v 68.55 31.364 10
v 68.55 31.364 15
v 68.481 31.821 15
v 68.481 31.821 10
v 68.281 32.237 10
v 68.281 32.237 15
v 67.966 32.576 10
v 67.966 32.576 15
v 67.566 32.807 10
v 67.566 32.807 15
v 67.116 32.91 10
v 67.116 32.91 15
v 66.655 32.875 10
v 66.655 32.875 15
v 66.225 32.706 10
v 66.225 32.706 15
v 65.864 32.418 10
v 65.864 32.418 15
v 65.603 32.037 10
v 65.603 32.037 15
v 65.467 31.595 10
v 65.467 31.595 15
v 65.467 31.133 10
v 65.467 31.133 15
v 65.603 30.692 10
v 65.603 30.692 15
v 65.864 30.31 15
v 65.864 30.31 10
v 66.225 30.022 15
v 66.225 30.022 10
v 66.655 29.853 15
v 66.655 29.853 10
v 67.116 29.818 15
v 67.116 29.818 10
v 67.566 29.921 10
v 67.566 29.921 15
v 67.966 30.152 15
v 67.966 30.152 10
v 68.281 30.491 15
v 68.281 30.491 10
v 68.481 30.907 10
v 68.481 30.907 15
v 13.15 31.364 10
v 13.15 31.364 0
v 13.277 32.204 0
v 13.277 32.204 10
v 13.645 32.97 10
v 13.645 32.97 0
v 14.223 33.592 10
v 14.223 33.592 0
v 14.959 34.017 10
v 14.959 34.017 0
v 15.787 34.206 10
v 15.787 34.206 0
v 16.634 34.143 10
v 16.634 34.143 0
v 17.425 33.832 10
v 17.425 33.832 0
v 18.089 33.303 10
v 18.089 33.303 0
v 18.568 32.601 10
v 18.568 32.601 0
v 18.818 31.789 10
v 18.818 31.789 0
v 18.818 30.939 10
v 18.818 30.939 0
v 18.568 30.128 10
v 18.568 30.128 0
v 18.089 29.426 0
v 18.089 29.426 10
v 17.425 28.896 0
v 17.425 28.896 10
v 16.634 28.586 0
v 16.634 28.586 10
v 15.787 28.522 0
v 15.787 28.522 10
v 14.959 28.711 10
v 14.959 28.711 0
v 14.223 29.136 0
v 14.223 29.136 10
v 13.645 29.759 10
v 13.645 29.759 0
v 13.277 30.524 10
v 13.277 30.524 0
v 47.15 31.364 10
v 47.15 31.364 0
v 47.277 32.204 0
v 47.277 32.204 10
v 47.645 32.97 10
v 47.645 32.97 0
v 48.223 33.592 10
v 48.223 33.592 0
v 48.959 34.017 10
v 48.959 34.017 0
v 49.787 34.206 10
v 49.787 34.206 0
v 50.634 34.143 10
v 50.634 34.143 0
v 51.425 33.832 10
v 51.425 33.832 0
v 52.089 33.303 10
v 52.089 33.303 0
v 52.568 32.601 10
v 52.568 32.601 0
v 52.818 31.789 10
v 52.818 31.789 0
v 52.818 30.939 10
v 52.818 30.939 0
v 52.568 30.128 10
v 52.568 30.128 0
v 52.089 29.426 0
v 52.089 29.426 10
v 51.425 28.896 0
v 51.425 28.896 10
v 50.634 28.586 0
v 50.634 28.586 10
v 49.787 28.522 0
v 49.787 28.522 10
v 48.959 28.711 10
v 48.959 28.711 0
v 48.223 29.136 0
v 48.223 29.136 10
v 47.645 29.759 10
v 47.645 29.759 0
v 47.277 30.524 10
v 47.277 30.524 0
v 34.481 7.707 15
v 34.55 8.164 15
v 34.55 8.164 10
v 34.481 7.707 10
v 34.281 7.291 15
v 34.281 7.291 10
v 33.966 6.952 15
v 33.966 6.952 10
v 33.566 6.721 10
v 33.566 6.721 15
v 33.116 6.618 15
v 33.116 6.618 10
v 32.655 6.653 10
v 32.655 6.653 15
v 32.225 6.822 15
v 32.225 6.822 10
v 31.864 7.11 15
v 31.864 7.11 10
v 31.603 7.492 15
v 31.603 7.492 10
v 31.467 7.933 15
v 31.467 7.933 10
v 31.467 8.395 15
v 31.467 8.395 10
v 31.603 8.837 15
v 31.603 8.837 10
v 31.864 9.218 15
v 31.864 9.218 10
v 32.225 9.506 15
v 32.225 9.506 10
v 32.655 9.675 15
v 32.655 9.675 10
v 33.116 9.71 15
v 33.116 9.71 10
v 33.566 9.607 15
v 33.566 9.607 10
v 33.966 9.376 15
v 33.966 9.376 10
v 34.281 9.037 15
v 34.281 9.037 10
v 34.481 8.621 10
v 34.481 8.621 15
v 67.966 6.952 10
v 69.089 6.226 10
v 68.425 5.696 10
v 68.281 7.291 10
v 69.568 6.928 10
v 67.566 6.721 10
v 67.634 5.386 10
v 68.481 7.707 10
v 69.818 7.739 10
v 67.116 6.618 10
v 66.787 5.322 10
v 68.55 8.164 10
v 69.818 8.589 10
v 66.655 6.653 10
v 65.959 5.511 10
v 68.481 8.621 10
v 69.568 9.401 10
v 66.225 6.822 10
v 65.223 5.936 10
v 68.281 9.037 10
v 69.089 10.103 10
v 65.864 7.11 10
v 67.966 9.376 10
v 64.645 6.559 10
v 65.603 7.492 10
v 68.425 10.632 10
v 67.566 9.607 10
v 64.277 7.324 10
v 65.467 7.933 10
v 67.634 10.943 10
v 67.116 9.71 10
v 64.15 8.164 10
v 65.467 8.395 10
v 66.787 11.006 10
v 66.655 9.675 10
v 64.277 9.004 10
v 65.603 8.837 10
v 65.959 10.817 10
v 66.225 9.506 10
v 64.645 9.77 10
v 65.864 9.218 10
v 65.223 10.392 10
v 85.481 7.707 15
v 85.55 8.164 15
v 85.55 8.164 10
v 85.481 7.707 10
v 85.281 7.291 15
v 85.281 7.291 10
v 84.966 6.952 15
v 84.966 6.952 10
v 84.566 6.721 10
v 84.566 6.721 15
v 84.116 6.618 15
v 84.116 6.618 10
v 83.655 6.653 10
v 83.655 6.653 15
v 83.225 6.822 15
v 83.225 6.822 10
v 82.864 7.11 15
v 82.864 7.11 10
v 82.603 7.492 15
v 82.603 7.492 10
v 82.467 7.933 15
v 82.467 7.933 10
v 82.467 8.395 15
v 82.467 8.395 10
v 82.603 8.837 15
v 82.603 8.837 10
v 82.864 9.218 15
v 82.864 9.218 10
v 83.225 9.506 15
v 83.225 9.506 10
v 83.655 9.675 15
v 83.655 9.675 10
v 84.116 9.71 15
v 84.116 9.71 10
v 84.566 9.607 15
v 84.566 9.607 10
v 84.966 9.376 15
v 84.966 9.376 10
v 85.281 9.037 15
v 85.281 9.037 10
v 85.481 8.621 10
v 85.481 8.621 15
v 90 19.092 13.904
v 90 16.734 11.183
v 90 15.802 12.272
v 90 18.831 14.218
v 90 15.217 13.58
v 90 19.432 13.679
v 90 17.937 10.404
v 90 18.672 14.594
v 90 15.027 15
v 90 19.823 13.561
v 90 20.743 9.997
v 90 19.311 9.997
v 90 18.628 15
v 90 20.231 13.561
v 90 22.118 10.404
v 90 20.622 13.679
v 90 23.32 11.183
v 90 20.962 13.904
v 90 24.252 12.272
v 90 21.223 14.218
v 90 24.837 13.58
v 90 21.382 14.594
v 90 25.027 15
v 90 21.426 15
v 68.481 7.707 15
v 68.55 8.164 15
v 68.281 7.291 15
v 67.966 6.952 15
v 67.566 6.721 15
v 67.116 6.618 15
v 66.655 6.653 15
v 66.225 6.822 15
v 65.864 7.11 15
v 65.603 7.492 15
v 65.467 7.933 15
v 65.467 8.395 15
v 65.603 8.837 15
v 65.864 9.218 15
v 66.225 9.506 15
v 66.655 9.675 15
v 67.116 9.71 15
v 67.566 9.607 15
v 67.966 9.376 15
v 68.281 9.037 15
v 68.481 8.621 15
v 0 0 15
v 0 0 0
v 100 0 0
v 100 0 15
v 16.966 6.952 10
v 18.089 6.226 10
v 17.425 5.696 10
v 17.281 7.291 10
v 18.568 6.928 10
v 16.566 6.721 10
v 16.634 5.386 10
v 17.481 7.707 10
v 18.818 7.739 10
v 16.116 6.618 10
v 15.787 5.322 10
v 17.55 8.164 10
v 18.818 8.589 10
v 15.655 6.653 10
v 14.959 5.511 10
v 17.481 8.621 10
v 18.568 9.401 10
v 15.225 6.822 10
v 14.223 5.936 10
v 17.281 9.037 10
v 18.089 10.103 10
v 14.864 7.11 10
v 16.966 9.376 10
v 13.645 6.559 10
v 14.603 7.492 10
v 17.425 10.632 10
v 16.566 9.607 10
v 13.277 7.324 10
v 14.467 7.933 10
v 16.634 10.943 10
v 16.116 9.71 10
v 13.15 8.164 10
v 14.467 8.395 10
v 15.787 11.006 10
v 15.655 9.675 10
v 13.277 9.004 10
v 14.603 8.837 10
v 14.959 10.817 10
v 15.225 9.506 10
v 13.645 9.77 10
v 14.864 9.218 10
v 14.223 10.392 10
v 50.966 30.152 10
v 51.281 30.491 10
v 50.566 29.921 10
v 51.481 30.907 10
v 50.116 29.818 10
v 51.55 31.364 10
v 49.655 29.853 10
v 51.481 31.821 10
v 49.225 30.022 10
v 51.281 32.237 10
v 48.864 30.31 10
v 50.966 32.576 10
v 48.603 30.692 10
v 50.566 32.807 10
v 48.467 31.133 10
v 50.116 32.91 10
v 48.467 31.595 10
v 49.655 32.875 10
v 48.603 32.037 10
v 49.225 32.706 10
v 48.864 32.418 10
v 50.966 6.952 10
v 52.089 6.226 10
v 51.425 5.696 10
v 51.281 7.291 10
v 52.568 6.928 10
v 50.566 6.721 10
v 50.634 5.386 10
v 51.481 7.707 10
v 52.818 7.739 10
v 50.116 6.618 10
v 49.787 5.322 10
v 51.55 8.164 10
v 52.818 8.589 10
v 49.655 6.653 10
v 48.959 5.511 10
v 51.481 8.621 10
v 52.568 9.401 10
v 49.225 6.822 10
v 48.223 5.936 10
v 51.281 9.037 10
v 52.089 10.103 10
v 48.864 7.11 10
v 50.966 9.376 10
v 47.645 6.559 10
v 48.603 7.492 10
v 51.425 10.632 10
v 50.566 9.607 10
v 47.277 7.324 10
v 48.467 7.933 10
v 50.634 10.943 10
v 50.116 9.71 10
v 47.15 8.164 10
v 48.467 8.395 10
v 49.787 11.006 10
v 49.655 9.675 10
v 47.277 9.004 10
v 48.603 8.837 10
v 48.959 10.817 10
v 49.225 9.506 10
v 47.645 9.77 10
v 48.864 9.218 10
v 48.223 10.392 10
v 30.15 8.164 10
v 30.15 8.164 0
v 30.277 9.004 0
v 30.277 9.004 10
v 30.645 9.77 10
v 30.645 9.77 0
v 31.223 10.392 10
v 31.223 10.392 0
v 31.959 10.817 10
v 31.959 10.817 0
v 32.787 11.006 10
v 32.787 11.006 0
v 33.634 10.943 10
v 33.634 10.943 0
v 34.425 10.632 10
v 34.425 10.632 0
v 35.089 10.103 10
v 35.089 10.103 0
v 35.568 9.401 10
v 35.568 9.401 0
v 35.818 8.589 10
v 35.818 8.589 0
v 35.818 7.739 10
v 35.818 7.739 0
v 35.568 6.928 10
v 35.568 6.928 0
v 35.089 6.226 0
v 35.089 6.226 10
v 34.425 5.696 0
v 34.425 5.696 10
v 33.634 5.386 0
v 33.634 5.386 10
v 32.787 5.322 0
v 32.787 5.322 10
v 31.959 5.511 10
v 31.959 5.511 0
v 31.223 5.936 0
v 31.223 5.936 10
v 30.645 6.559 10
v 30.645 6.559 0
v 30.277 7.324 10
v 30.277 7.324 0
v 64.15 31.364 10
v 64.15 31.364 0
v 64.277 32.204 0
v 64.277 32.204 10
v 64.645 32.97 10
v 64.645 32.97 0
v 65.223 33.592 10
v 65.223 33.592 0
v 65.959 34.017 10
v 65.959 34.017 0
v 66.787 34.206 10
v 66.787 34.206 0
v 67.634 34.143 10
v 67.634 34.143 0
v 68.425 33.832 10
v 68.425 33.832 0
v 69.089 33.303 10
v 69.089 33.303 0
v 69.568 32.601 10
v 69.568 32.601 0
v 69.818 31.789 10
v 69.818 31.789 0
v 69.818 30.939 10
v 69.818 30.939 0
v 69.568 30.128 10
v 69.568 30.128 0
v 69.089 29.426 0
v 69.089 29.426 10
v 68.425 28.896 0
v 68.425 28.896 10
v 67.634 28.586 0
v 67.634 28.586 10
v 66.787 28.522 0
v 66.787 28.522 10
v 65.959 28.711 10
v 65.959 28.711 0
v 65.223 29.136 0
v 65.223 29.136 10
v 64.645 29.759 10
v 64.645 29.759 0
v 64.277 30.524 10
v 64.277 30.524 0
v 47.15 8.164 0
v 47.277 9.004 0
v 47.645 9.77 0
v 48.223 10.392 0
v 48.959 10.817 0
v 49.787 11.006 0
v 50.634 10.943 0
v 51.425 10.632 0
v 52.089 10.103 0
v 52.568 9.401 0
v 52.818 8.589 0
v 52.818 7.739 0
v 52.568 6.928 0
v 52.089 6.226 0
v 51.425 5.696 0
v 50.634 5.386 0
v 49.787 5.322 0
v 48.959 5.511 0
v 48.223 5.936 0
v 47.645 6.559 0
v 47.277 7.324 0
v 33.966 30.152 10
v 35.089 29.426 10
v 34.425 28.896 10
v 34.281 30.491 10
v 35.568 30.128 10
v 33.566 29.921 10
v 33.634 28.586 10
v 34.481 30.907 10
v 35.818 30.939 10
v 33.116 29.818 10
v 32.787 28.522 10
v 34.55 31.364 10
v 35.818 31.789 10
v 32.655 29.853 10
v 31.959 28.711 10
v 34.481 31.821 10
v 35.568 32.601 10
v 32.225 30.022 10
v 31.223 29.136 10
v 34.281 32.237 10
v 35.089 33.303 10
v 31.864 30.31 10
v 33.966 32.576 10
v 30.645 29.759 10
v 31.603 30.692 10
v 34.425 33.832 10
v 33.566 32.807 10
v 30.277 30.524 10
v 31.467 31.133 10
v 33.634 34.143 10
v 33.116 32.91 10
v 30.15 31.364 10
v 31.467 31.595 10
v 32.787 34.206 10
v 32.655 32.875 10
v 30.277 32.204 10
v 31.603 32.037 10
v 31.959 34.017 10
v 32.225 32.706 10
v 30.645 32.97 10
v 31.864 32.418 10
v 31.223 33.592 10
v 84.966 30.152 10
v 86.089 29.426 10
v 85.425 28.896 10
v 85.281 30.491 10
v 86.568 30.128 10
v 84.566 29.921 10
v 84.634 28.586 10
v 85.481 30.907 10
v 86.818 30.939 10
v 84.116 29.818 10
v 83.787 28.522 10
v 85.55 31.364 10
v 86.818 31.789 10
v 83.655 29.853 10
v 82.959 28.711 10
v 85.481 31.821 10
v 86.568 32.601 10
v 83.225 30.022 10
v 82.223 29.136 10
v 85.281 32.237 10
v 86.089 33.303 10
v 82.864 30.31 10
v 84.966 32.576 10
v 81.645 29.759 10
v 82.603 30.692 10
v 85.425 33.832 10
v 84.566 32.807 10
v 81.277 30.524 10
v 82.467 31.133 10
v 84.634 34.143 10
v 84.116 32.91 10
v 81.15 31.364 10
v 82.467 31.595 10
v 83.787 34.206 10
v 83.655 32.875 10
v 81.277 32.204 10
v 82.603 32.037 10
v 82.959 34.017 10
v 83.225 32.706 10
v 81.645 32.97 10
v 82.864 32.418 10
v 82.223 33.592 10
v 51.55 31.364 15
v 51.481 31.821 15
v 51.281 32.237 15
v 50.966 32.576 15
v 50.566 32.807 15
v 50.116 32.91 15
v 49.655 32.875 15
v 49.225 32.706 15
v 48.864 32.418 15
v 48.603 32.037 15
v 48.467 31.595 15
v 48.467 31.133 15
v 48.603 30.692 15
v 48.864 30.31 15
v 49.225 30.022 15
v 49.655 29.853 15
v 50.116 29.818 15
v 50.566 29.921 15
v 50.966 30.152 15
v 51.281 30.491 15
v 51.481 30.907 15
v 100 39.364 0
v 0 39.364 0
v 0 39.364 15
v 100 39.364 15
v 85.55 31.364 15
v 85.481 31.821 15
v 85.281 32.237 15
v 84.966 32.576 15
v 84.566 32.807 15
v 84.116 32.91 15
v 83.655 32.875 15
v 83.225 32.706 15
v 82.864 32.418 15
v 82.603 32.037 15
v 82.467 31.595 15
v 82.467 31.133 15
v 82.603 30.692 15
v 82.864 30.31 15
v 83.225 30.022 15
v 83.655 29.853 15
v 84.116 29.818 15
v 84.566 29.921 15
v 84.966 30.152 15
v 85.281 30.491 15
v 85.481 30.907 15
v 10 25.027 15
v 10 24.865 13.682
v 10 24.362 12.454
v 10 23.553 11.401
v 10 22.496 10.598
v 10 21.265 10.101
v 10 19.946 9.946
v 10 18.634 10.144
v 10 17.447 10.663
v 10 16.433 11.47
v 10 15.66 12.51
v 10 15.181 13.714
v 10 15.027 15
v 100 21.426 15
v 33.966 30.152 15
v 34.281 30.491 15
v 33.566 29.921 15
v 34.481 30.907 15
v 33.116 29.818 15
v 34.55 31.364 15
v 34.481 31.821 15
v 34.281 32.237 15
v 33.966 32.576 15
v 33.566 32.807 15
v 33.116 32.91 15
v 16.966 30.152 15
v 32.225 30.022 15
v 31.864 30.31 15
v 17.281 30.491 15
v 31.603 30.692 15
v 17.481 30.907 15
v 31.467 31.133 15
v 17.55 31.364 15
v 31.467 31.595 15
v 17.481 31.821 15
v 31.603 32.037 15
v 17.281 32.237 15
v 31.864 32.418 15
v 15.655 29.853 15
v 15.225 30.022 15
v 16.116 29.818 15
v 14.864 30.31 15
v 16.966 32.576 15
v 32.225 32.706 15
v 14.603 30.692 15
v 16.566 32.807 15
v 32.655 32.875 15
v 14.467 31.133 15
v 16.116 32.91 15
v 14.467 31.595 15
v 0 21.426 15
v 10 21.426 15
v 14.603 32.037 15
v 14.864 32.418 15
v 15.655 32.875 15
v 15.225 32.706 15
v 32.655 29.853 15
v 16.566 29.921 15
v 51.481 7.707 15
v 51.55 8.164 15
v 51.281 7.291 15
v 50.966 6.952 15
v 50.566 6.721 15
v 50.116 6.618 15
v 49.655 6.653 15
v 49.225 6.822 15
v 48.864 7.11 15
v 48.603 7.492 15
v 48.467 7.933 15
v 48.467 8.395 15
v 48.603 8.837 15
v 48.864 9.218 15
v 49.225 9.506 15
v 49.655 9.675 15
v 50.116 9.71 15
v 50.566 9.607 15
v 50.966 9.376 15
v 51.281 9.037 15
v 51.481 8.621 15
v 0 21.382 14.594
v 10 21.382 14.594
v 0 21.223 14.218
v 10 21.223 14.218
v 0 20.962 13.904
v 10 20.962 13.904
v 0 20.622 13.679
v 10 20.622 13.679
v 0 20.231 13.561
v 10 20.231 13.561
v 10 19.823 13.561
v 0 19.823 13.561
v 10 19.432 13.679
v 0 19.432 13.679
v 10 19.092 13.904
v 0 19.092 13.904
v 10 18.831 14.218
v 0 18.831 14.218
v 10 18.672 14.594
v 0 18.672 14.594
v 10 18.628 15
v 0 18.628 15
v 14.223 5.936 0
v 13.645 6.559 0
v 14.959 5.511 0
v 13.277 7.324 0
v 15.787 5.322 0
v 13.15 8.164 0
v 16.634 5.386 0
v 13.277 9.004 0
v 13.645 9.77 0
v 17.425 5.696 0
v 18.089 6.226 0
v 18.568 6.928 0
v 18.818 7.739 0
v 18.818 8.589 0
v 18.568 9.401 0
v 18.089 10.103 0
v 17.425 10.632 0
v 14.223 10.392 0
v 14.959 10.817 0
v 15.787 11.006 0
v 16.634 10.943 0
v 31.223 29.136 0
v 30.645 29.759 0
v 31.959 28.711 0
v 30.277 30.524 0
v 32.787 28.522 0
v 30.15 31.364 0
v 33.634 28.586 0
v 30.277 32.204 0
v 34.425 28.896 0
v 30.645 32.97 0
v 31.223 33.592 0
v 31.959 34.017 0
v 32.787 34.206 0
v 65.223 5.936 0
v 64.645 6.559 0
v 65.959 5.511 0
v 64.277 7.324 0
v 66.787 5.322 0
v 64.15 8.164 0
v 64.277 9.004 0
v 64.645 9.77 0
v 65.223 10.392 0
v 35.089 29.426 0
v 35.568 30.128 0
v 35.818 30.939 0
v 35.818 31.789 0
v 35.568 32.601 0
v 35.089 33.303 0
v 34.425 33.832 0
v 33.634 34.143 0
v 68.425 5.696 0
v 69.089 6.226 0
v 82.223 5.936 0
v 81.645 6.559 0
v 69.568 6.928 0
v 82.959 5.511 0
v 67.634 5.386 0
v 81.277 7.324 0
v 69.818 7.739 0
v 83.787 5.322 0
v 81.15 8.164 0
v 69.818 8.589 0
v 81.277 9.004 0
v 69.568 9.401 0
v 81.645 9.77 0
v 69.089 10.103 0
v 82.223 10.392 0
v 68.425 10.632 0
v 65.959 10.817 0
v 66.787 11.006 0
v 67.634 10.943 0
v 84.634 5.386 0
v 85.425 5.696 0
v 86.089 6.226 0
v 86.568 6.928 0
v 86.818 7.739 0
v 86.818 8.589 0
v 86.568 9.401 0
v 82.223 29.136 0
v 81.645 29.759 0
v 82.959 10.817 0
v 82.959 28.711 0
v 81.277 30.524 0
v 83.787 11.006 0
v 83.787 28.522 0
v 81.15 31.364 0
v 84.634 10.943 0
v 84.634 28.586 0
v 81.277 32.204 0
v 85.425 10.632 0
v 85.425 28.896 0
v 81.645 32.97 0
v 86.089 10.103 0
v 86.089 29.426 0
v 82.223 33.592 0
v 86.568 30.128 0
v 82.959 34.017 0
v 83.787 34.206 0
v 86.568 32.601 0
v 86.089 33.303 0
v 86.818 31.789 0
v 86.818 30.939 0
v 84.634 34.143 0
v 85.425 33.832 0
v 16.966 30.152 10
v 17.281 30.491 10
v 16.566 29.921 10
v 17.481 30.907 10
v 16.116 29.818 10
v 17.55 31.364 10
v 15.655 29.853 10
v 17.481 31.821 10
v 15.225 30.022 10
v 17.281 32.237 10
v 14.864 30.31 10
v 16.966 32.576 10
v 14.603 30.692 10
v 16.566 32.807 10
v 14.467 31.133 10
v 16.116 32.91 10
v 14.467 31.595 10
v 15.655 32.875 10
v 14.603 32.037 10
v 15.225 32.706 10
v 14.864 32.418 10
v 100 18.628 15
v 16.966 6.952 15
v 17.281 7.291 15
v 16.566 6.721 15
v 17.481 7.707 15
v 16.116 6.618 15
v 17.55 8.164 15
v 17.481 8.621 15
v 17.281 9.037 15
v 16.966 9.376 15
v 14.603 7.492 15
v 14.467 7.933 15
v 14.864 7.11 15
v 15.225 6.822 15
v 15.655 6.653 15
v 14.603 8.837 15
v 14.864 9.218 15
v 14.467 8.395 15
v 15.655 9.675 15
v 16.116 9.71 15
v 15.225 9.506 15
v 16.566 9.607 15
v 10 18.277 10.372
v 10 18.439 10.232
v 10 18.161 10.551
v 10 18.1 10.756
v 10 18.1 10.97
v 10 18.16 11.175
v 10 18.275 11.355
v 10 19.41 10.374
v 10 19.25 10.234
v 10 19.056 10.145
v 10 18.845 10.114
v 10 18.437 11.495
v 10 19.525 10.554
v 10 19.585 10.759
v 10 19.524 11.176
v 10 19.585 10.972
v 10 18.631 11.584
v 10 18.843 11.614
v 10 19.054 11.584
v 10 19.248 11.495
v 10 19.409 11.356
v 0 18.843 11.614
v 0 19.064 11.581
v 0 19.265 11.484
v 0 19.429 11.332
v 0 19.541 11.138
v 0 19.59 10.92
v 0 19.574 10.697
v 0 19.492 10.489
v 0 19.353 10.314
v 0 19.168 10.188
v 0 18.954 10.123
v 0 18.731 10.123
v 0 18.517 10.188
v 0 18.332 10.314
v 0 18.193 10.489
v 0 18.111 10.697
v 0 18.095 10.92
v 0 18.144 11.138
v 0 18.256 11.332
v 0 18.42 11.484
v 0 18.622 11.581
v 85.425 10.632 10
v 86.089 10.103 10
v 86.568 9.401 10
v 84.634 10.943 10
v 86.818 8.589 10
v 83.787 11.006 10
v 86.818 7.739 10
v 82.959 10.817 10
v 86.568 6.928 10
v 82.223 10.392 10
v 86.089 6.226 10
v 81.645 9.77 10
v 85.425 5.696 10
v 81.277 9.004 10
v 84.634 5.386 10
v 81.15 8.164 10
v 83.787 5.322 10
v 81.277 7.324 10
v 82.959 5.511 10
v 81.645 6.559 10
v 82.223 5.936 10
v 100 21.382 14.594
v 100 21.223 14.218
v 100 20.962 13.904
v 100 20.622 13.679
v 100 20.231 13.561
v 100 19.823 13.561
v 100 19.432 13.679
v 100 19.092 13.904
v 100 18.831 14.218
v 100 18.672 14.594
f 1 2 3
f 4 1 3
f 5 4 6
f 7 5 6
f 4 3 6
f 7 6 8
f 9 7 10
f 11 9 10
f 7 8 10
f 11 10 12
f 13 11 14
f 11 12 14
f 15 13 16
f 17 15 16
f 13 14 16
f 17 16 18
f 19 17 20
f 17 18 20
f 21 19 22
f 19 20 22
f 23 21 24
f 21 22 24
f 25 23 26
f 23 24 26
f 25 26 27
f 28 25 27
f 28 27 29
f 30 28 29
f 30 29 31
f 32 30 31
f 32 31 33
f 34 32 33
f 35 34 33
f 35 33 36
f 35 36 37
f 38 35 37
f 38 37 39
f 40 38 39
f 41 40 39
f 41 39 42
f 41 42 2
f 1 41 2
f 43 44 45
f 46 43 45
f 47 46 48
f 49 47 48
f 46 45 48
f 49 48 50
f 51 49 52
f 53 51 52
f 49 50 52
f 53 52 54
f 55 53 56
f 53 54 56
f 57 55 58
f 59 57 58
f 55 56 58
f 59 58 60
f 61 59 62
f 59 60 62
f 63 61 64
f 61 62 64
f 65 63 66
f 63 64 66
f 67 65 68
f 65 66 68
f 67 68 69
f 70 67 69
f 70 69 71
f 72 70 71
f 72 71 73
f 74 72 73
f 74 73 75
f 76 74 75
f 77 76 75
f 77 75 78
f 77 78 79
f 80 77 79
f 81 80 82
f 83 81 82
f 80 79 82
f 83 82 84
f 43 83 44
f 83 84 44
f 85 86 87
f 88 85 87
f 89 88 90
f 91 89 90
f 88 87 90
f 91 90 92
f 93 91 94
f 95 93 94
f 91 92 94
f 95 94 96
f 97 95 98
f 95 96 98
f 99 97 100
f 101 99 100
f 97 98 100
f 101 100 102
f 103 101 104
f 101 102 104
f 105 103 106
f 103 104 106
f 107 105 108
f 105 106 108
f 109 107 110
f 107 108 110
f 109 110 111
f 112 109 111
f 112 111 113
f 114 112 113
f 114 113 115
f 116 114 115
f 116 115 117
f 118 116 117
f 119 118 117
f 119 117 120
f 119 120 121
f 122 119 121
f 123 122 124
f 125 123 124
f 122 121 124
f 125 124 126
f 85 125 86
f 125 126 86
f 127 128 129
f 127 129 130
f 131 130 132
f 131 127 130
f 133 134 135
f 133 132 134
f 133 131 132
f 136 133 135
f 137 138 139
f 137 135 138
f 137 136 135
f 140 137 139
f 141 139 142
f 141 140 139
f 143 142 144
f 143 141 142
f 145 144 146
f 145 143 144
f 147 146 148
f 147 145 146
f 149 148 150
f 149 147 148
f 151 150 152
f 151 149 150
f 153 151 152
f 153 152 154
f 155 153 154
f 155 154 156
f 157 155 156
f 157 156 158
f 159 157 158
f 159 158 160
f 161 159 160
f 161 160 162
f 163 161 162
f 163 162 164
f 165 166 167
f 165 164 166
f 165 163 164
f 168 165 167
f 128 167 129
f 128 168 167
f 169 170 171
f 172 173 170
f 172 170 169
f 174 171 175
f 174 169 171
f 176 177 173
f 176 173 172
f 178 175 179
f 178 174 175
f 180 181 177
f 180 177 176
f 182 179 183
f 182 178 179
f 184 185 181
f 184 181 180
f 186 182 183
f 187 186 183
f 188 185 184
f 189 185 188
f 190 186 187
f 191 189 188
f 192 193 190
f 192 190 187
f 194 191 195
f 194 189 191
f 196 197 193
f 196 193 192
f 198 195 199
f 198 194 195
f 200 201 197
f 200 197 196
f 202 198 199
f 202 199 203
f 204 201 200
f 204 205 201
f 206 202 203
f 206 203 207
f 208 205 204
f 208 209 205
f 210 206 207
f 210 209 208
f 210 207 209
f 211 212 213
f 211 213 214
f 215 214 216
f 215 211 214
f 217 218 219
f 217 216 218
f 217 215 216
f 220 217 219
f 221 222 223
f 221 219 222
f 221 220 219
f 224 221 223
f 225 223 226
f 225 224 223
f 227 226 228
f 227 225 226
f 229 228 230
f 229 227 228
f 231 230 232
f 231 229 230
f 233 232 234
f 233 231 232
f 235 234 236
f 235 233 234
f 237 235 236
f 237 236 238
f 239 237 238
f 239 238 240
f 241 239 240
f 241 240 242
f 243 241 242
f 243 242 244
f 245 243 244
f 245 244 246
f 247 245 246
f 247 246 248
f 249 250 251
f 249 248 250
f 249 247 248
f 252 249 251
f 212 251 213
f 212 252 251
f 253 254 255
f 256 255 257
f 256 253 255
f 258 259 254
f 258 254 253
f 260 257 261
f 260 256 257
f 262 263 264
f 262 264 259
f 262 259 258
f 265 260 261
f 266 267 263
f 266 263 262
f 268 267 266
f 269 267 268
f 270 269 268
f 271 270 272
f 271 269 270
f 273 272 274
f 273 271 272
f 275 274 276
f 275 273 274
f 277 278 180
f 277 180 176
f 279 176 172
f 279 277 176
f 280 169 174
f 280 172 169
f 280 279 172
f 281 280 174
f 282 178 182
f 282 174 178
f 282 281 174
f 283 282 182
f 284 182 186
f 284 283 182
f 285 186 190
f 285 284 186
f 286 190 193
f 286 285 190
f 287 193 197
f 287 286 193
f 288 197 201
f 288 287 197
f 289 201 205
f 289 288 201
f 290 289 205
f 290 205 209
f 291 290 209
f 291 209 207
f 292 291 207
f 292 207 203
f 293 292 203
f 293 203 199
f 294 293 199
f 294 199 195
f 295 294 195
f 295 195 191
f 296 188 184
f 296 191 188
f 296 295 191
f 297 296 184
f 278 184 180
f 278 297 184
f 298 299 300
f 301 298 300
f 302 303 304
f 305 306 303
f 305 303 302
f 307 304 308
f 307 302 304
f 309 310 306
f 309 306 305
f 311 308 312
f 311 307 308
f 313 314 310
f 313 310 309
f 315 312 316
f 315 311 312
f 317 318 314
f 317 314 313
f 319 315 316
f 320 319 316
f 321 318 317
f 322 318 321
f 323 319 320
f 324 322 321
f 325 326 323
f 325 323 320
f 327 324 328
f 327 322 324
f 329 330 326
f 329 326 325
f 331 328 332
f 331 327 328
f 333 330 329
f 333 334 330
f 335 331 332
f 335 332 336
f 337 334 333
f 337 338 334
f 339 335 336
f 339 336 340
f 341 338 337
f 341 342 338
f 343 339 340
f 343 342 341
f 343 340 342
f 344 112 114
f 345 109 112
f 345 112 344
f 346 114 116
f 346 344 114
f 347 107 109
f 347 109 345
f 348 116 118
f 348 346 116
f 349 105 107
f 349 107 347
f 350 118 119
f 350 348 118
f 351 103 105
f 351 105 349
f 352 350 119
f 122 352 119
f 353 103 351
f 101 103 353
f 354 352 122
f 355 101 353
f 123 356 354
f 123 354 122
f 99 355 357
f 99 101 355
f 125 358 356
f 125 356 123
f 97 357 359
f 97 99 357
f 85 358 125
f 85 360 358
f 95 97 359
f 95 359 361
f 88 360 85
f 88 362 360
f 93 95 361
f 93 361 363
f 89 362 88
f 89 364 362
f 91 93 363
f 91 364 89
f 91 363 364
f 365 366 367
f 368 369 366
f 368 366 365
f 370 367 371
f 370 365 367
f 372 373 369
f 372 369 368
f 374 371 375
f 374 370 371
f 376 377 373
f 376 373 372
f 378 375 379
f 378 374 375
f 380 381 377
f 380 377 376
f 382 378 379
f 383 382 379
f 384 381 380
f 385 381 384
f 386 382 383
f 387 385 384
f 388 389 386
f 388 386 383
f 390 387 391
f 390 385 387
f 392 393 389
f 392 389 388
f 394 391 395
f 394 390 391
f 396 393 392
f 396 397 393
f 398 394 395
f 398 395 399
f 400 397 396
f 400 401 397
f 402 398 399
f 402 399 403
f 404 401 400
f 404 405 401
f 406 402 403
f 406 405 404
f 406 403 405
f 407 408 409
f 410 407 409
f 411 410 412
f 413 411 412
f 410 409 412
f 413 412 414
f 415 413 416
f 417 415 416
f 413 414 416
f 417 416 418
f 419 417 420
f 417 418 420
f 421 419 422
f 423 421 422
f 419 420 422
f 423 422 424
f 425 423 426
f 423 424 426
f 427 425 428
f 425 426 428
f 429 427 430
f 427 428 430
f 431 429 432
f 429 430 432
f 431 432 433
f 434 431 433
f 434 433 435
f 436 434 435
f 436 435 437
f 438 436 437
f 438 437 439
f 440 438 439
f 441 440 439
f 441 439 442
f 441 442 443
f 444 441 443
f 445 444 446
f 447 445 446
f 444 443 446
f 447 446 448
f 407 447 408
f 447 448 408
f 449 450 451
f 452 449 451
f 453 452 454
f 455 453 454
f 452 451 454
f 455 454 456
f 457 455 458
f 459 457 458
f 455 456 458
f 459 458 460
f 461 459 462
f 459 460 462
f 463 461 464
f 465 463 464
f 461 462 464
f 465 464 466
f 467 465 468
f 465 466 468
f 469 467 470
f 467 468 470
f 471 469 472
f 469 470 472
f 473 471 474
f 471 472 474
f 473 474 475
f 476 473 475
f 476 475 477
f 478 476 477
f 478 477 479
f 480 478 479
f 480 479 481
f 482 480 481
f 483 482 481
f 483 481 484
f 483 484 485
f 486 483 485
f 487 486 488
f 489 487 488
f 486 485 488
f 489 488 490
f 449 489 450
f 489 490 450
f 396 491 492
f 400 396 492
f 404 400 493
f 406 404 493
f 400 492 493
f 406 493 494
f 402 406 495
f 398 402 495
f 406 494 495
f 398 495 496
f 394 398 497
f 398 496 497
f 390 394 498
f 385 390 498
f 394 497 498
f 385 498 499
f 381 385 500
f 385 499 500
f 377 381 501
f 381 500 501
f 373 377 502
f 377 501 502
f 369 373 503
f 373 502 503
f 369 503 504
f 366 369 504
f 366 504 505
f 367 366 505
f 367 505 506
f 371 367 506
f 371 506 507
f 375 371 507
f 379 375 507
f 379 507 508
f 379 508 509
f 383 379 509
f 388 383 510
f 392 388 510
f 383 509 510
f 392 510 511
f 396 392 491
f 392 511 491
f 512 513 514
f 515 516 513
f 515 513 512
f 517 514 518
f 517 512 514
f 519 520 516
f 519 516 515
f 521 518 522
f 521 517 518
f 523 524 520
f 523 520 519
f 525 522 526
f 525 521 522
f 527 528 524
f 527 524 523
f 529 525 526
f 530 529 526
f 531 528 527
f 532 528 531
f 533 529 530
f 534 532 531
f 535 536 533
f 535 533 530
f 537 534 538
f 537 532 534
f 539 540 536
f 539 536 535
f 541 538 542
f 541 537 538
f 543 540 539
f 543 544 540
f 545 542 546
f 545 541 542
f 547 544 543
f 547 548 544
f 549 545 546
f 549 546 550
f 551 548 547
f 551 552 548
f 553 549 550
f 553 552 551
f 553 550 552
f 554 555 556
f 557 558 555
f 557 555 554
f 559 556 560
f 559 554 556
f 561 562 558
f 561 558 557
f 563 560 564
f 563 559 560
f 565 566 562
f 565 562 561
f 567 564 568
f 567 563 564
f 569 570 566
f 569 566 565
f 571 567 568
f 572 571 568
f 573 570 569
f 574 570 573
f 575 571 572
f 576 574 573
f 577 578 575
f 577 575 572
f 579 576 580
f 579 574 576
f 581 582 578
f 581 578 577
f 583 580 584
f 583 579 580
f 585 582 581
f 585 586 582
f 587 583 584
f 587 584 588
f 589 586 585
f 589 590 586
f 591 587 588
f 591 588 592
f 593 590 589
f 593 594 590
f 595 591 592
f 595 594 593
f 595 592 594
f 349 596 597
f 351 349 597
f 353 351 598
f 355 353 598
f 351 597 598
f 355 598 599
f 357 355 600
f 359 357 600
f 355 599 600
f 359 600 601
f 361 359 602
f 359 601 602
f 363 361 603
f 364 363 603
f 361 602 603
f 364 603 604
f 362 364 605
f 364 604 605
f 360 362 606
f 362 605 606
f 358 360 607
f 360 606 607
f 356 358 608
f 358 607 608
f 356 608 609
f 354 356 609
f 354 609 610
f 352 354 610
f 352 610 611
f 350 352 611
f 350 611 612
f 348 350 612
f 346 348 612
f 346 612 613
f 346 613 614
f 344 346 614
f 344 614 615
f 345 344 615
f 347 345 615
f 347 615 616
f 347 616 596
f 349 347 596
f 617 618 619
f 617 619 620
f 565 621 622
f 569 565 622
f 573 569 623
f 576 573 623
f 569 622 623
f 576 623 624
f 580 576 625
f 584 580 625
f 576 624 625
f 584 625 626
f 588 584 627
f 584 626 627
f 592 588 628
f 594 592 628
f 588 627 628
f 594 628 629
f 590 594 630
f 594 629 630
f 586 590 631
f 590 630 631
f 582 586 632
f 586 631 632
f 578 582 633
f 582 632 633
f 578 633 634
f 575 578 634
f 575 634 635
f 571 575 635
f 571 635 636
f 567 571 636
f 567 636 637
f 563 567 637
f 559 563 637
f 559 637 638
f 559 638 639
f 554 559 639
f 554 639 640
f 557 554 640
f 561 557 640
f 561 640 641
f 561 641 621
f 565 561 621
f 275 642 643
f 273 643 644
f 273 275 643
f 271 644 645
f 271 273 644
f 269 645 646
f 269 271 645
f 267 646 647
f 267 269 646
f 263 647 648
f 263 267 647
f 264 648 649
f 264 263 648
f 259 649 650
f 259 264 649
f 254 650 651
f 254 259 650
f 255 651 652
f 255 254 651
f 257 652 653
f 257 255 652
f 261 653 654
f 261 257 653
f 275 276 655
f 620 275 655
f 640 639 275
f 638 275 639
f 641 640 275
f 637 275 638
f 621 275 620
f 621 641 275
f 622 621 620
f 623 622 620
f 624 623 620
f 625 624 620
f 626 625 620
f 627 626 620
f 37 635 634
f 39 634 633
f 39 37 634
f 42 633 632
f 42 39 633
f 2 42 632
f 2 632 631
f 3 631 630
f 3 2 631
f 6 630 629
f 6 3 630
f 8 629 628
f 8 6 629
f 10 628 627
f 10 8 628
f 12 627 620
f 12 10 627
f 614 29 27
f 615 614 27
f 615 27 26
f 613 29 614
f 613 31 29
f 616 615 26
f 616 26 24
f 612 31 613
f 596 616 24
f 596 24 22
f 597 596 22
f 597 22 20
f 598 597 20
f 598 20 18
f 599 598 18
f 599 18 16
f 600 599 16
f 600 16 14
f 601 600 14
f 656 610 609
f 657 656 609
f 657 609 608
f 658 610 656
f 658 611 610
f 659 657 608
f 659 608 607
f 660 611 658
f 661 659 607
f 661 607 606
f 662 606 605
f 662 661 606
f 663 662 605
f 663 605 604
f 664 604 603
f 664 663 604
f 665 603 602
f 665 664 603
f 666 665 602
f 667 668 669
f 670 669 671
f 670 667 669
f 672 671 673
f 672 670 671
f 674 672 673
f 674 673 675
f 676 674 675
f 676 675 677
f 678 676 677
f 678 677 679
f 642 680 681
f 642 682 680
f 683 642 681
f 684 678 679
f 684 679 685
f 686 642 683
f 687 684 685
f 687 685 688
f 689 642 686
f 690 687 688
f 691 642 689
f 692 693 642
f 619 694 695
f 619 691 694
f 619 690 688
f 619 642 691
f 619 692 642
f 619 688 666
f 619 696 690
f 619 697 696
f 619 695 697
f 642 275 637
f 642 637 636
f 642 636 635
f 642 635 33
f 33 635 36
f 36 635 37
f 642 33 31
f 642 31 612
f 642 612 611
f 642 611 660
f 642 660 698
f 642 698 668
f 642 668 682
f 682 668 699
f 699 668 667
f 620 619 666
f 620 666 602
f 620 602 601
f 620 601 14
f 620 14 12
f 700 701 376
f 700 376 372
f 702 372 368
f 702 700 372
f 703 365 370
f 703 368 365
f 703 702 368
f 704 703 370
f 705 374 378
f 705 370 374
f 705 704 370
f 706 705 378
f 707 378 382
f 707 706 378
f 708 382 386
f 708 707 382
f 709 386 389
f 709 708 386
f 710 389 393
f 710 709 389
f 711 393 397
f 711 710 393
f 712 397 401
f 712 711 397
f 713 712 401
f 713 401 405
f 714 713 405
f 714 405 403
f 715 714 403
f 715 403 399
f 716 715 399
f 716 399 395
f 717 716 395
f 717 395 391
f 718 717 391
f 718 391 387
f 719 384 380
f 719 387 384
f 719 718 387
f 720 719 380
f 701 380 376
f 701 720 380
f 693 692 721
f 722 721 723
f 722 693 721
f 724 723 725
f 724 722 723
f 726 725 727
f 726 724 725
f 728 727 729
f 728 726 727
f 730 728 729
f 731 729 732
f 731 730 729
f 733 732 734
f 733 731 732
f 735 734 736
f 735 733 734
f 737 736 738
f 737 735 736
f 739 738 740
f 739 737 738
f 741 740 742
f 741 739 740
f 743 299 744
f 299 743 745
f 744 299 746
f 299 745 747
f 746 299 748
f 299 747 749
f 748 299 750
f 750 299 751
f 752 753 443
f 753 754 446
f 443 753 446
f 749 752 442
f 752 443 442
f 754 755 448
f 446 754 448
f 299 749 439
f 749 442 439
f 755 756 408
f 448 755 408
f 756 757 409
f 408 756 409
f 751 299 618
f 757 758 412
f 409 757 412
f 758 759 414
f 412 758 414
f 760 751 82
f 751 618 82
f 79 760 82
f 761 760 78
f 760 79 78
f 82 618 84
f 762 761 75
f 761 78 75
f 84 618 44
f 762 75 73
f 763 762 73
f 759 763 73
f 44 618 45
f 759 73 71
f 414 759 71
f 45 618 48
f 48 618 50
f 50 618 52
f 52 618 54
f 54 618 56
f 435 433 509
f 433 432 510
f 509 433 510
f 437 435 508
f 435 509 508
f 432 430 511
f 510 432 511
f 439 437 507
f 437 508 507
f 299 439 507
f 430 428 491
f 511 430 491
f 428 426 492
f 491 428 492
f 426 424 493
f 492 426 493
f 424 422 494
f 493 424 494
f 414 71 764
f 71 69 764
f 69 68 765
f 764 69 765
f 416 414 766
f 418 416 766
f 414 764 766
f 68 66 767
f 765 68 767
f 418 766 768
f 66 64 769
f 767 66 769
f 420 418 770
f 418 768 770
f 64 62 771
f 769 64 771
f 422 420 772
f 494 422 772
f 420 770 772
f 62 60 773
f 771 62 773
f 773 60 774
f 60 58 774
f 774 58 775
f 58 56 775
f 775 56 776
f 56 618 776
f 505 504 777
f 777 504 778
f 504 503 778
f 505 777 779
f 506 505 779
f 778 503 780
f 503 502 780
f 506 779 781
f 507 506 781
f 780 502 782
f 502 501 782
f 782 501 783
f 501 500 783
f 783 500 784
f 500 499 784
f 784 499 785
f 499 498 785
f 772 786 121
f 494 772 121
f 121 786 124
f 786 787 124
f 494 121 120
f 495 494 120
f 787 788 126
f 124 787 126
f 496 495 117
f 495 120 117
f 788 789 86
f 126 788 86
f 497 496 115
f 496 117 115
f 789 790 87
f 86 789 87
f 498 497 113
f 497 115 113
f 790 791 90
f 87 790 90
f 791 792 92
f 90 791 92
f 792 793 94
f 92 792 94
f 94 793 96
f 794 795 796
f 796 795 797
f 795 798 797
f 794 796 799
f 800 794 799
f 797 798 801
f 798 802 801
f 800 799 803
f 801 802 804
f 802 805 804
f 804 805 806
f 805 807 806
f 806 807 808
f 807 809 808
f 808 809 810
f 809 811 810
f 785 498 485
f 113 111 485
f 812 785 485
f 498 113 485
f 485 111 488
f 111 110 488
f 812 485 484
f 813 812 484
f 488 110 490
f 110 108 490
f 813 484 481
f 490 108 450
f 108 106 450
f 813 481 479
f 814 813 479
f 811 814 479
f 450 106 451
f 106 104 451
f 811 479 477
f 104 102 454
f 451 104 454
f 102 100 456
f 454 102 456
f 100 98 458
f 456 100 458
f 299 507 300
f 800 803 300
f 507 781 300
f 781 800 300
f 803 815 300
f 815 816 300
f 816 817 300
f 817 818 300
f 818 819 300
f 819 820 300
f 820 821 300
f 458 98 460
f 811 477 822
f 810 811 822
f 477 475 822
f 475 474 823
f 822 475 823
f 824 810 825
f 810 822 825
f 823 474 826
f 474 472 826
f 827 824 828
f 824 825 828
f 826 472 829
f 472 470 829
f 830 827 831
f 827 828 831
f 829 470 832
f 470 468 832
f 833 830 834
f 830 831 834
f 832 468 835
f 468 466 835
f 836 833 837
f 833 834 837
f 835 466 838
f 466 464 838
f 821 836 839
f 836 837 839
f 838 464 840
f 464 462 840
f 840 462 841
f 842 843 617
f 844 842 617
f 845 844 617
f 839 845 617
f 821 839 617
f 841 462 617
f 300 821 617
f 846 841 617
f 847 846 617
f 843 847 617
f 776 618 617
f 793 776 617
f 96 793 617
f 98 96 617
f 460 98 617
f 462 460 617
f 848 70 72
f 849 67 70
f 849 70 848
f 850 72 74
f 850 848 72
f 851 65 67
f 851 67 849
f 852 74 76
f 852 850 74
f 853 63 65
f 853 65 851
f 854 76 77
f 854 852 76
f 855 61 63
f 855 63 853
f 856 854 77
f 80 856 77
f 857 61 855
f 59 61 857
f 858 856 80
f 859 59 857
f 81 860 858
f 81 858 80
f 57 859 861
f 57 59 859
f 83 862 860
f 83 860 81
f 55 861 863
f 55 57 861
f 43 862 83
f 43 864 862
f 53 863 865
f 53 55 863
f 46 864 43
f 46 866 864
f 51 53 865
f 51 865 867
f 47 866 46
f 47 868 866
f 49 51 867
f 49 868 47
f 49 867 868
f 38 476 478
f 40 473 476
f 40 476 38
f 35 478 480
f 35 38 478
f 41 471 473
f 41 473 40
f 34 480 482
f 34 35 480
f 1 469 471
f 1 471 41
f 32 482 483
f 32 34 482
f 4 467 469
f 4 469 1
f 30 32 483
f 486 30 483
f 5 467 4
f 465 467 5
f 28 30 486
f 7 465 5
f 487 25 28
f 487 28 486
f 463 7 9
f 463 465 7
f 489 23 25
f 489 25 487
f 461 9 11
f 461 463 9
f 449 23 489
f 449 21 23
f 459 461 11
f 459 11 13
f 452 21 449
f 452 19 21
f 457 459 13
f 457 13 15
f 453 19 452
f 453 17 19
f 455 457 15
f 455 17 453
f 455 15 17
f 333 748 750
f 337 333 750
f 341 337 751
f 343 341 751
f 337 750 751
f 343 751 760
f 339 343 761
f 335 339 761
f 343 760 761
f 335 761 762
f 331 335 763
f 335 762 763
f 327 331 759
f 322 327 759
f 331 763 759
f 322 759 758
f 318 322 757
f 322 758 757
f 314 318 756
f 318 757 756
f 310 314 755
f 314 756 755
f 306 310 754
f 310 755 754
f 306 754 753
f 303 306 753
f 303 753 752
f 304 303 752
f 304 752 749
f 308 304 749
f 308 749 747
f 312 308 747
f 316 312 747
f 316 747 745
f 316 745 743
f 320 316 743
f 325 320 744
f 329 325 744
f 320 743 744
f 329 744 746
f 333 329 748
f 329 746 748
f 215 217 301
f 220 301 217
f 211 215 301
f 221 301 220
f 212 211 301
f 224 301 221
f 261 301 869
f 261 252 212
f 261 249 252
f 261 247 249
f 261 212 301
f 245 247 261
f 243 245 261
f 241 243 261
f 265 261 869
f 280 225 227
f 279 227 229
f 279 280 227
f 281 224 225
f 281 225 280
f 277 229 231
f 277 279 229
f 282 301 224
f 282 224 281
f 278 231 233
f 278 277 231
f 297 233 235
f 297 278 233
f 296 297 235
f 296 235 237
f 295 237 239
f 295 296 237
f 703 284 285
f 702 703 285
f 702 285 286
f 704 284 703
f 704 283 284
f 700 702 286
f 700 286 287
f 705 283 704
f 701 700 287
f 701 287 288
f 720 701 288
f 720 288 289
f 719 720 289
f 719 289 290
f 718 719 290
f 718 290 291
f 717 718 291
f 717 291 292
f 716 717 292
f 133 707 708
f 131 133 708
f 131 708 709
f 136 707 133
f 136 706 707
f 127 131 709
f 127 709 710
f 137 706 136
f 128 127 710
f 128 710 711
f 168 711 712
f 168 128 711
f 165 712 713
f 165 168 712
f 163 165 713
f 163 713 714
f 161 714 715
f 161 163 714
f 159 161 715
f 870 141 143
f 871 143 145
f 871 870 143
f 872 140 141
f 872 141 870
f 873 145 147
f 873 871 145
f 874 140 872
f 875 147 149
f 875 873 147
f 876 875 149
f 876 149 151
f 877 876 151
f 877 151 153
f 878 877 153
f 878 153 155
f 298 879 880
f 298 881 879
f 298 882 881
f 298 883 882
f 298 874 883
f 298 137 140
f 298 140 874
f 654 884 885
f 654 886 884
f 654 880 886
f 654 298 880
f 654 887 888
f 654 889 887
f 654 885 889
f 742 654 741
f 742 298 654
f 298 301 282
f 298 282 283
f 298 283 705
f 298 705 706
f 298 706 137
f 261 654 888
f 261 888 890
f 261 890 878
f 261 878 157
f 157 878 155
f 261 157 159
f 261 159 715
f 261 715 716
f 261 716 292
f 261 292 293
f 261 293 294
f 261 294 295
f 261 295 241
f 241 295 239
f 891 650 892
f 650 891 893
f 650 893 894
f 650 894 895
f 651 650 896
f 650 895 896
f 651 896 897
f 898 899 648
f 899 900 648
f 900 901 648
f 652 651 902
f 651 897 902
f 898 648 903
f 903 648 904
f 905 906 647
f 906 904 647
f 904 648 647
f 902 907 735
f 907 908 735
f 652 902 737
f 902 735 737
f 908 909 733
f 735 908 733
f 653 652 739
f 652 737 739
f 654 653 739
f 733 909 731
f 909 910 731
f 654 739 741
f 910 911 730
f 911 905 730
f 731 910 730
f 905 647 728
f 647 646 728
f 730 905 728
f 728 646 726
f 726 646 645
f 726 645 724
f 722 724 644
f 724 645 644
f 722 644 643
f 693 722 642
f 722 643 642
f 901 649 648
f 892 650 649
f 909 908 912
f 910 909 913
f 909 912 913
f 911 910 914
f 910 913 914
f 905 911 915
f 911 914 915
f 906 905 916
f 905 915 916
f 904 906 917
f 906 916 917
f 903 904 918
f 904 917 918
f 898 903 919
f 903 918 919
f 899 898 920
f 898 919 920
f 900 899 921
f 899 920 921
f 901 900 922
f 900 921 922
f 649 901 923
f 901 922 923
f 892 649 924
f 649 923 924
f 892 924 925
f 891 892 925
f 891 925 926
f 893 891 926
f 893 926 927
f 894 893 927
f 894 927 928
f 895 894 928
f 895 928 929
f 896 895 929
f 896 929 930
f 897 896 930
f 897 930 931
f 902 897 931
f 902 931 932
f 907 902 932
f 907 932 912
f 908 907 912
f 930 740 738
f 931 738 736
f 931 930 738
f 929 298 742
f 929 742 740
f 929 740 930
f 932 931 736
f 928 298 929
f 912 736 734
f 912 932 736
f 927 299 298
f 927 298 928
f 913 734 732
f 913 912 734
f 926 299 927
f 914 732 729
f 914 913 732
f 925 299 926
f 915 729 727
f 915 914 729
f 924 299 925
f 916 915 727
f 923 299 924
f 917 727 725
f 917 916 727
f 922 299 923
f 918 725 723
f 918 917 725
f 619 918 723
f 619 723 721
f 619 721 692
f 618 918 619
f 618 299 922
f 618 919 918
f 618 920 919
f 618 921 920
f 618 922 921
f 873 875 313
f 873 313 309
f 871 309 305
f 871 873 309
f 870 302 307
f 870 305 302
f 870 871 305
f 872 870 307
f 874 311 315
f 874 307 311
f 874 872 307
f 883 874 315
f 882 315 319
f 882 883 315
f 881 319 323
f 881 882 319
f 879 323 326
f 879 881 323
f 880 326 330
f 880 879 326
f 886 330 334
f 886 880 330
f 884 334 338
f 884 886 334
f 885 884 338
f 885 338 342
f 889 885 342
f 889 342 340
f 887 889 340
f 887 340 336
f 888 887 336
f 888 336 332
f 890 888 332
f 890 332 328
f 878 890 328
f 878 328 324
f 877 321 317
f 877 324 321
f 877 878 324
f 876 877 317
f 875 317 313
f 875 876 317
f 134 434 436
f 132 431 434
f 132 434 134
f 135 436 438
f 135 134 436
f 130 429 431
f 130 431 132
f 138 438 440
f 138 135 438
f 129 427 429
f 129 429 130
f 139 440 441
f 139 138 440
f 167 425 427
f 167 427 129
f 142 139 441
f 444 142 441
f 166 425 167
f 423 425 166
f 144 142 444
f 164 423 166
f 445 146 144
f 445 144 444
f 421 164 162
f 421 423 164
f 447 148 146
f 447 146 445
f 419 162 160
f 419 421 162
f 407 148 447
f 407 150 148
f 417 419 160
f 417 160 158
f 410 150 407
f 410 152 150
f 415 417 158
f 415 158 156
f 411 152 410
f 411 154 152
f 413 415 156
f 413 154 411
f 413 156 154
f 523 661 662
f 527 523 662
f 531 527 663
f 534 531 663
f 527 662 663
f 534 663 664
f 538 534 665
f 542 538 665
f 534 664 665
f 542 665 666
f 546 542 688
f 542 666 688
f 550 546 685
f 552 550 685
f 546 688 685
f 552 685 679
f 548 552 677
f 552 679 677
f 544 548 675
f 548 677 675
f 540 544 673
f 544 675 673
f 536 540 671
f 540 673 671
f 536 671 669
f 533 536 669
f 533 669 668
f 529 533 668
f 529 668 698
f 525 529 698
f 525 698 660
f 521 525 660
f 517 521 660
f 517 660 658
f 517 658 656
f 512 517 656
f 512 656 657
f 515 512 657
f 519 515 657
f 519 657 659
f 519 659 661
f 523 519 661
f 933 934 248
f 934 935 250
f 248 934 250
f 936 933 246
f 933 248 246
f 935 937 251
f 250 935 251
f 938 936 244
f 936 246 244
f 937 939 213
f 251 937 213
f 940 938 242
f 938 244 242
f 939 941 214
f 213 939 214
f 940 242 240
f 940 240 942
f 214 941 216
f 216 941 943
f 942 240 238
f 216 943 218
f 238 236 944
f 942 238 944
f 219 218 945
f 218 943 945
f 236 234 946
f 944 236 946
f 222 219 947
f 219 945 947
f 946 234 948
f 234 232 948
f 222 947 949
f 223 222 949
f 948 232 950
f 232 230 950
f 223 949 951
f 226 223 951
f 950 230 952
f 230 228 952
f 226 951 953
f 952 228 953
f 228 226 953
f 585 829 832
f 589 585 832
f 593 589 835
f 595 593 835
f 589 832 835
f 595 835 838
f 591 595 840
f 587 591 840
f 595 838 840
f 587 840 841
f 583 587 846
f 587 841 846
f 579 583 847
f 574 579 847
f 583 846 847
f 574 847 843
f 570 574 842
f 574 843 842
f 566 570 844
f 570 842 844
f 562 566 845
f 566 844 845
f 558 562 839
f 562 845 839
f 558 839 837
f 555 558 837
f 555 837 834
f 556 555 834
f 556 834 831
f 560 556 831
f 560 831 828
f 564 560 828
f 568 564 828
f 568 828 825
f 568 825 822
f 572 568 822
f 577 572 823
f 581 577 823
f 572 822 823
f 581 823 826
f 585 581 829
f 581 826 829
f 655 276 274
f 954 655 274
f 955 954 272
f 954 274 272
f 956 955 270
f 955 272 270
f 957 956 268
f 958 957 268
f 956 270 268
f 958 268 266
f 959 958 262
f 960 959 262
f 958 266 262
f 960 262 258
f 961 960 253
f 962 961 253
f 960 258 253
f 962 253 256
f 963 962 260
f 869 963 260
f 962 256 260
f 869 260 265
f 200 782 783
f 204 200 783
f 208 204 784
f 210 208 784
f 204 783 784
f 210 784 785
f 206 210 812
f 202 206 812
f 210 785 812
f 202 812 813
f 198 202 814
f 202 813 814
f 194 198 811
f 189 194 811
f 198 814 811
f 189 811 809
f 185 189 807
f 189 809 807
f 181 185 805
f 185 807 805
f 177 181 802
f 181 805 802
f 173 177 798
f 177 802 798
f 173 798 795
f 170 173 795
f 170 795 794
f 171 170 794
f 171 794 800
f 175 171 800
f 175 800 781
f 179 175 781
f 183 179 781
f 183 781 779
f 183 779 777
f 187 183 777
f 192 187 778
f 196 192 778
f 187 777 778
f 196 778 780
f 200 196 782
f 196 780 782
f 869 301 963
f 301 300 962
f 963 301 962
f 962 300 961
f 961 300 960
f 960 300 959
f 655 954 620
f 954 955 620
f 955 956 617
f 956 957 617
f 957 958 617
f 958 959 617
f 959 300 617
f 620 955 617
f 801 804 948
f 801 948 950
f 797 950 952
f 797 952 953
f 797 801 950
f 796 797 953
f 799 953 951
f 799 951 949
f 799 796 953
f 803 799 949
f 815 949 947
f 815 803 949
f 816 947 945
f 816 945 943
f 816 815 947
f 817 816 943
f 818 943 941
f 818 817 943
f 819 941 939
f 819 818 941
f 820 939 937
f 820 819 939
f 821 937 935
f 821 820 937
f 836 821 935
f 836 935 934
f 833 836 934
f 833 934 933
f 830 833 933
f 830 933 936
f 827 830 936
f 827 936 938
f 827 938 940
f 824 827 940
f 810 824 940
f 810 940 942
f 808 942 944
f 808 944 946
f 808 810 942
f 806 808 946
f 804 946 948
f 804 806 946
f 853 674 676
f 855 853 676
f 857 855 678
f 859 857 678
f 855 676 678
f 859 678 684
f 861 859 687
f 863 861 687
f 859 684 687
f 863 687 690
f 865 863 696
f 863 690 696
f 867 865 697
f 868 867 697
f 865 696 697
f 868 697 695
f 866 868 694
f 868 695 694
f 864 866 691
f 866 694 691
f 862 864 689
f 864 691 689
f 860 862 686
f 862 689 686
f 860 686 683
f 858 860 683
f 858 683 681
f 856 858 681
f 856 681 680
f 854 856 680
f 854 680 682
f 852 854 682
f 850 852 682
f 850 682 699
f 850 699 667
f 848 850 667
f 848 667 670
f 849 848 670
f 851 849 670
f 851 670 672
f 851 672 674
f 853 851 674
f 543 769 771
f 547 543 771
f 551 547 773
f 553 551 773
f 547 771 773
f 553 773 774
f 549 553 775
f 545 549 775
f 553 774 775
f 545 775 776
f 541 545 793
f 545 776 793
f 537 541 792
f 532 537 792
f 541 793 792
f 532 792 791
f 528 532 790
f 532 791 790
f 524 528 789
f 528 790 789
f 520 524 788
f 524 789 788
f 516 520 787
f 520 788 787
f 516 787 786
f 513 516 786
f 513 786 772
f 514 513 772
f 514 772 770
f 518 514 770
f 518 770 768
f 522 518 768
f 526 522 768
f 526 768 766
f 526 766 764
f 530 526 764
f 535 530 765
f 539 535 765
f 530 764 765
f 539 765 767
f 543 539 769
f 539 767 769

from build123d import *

# Parameters (mm, degrees)
SKIZZE2_W                            = 100
SKIZZE2_H                            = 39.364160046
AUFSATZ_LINEAR_AUSTRAGEN1_DEPTH      = 30
SCHNITT_LINEAR_AUSTRAGEN1_DEPTH      = 40
SCHNITT_LINEAR_AUSTRAGEN1_DEPTH_BACK = 40
SKIZZE10_R                           = 5
SKIZZE17_R                           = 1.4
SCHNITT_LINEAR_AUSTRAGEN2_DEPTH      = 103.710939516
SKIZZE24_R                           = 1.55
SCHNITT_LINEAR_AUSTRAGEN4_DEPTH      = 112.577493681
SKIZZE37_R                           = 0.736865544
SCHNITT_LINEAR_AUSTRAGEN9_DEPTH      = 112.577493681
SKIZZE40_R                           = 2.1
SCHNITT_LINEAR_AUSTRAGEN10_DEPTH     = 6
SKIZZE42_R                           = 0.75
SCHNITT_LINEAR_AUSTRAGEN12_DEPTH     = 10
VERRUNDUNG1_R                        = 1
SKIZZE46_R                           = 2.85
SCHNITT_LINEAR_AUSTRAGEN15_DEPTH     = 10
SCHNITT_LINEAR_START                 = -5
SCHNITT_LINEAR_AUSTRAGEN25_DEPTH     = 2.7
LINEARES_MUSTER1_COUNT               = 5
LINEARES_MUSTER1_PITCH               = 17
SPIEGELN2_COPY_1_SKETCH_R            = 2.85
SPIEGELN2_COPY_1_DEPTH               = 10
SPIEGELN2_COPY_2_SKETCH_R            = 2.85
SPIEGELN2_COPY_2_DEPTH               = 10
SPIEGELN2_COPY_3_SKETCH_R            = 2.85
SPIEGELN2_COPY_3_DEPTH               = 10
SPIEGELN2_COPY_4_SKETCH_R            = 2.85
SPIEGELN2_COPY_4_DEPTH               = 10
SPIEGELN2_START                      = -5
SPIEGELN2_COPY_5_DEPTH               = 2.7
SPIEGELN2_COPY_6_DEPTH               = 2.7
SPIEGELN2_COPY_7_DEPTH               = 2.7
SPIEGELN2_COPY_8_DEPTH               = 2.7
SKIZZE51_W                           = 15
SKIZZE51_H                           = 39.364160046
SCHNITT_LINEAR_AUSTRAGEN26_DEPTH     = 112.577493681


with BuildPart() as part:
    # Skizze2 → Aufsatz-Linear austragen1 (new body)
    with BuildSketch(Plane.XY):
        with Locations((50, 19.682080023)):
            Rectangle(SKIZZE2_W, SKIZZE2_H)
    extrude(amount=AUFSATZ_LINEAR_AUSTRAGEN1_DEPTH)

    # Skizze10 → Schnitt-Linear austragen1 (cut, two sides: drawn at the far end of the back side and taken through both)
    with BuildSketch(Plane.ZY.offset(-50).offset(-SCHNITT_LINEAR_AUSTRAGEN1_DEPTH_BACK)):
        with Locations((14.945770016, 20.027045739)):
            Circle(SKIZZE10_R)
    extrude(amount=SCHNITT_LINEAR_AUSTRAGEN1_DEPTH + SCHNITT_LINEAR_AUSTRAGEN1_DEPTH_BACK, mode=Mode.SUBTRACT)

    # Skizze17 → Schnitt-Linear austragen2 (cut, through all)
    with BuildSketch(Plane.ZY.offset(-90)):
        with Locations((14.945770016, 20.027045739)):
            Circle(SKIZZE17_R)
    schnitt_linear_austragen2 = extrude(amount=-SCHNITT_LINEAR_AUSTRAGEN2_DEPTH, mode=Mode.SUBTRACT)

    # Spiegeln1: Schnitt-Linear austragen2 across plane
    add(schnitt_linear_austragen2.mirror(Plane.ZY.offset(-50)), mode=Mode.SUBTRACT)

    # Skizze24 → Schnitt-Linear austragen4 (cut, through all)
    with BuildSketch(Plane.XY.offset(30)):
        with Locations((16, 31.364160046)):
            Circle(SKIZZE24_R)
        with Locations((33, 31.364160046)):
            Circle(SKIZZE24_R)
        with Locations((50, 31.364160046)):
            Circle(SKIZZE24_R)
        with Locations((67, 31.364160046)):
            Circle(SKIZZE24_R)
        with Locations((84, 31.364160046)):
            Circle(SKIZZE24_R)
    schnitt_linear_austragen4 = extrude(amount=-SCHNITT_LINEAR_AUSTRAGEN4_DEPTH, mode=Mode.SUBTRACT)

    # Skizze37 → Schnitt-Linear austragen9 (cut, through all)
    with BuildSketch(Plane(origin=(100, 0, 0), x_dir=(0, 0, -1), z_dir=(1, 0, 0))):
        with Locations((-18.924590299, 18.633559666)):
            Circle(SKIZZE37_R)
    extrude(amount=-SCHNITT_LINEAR_AUSTRAGEN9_DEPTH, mode=Mode.SUBTRACT)

    # Skizze40 → Schnitt-Linear austragen10 (cut)
    with BuildSketch(Plane(origin=(100, 0, 0), x_dir=(0, 0, -1), z_dir=(1, 0, 0))):
        with Locations((-18.924590299, 18.633559666)):
            Circle(SKIZZE40_R)
    extrude(amount=-SCHNITT_LINEAR_AUSTRAGEN10_DEPTH, mode=Mode.SUBTRACT)

    # Skizze42 → Schnitt-Linear austragen12 (cut)
    with BuildSketch(Plane.ZY):
        with Locations((10.86415918, 18.842582577)):
            Circle(SKIZZE42_R)
    extrude(amount=-SCHNITT_LINEAR_AUSTRAGEN12_DEPTH, mode=Mode.SUBTRACT)

    # Verrundung1
    verrundung1_edges = [part.edges().sort_by_distance(p)[0] for p in [
        (94, 18.633559666, 19.661455843),
    ]]
    fillet(verrundung1_edges, radius=VERRUNDUNG1_R)

    # Skizze46 → Schnitt-Linear austragen15 (cut)
    with BuildSketch(Plane(origin=(0, 0, 0), x_dir=(-1, 0, 0), z_dir=(0, 0, -1))):
        with Locations((-84, 31.364160046)):
            Circle(SKIZZE46_R)
    schnitt_linear_austragen15 = extrude(amount=-SCHNITT_LINEAR_AUSTRAGEN15_DEPTH, mode=Mode.SUBTRACT)

    # Skizze50 → Schnitt-Linear austragen25 (cut)
    with BuildSketch(Plane.XY.offset(30).offset(SCHNITT_LINEAR_START)):
        Polygon((81.15, 33.009608314), (81.15, 39.364160046), (86.85, 39.364160046), (86.85, 33.009608314), (86.85, 29.718711779), (84, 28.073263512), (81.15, 29.718711779), align=None)
    schnitt_linear_austragen25 = extrude(amount=-SCHNITT_LINEAR_AUSTRAGEN25_DEPTH, mode=Mode.SUBTRACT)

    # Lineares Muster1: Schnitt-Linear austragen15, Schnitt-Linear austragen25 ×5
    with Locations(*[(-i * LINEARES_MUSTER1_PITCH, 0, 0) for i in range(1, LINEARES_MUSTER1_COUNT)]):
        add(schnitt_linear_austragen15, mode=Mode.SUBTRACT)
        add(schnitt_linear_austragen25, mode=Mode.SUBTRACT)

    # Spiegeln2: Schnitt-Linear austragen15, Schnitt-Linear austragen25 across plane
    add(schnitt_linear_austragen15.mirror(Plane.ZX.offset(19.764160046)), mode=Mode.SUBTRACT)
    add(schnitt_linear_austragen25.mirror(Plane.ZX.offset(19.764160046)), mode=Mode.SUBTRACT)

    # Spiegeln2 copy 1 sketch → Spiegeln2 copy 1 (cut)
    with BuildSketch(Plane(origin=(-17, 39.528320093, 0), x_dir=(-1, 0, 0), z_dir=(0, 0, -1))):
        with Locations((-84, -31.364160046)):
            Circle(SPIEGELN2_COPY_1_SKETCH_R)
    extrude(amount=-SPIEGELN2_COPY_1_DEPTH, mode=Mode.SUBTRACT)

    # Spiegeln2 copy 2 sketch → Spiegeln2 copy 2 (cut)
    with BuildSketch(Plane(origin=(-34, 39.528320093, 0), x_dir=(-1, 0, 0), z_dir=(0, 0, -1))):
        with Locations((-84, -31.364160046)):
            Circle(SPIEGELN2_COPY_2_SKETCH_R)
    extrude(amount=-SPIEGELN2_COPY_2_DEPTH, mode=Mode.SUBTRACT)

    # Spiegeln2 copy 3 sketch → Spiegeln2 copy 3 (cut)
    with BuildSketch(Plane(origin=(-51, 39.528320093, 0), x_dir=(-1, 0, 0), z_dir=(0, 0, -1))):
        with Locations((-84, -31.364160046)):
            Circle(SPIEGELN2_COPY_3_SKETCH_R)
    extrude(amount=-SPIEGELN2_COPY_3_DEPTH, mode=Mode.SUBTRACT)

    # Spiegeln2 copy 4 sketch → Spiegeln2 copy 4 (cut)
    with BuildSketch(Plane(origin=(-68, 39.528320093, 0), x_dir=(-1, 0, 0), z_dir=(0, 0, -1))):
        with Locations((-84, -31.364160046)):
            Circle(SPIEGELN2_COPY_4_SKETCH_R)
    extrude(amount=-SPIEGELN2_COPY_4_DEPTH, mode=Mode.SUBTRACT)

    # Spiegeln2 copy 5 sketch → Spiegeln2 copy 5 (cut)
    with BuildSketch(Plane(origin=(-17, 39.528320093, 30), x_dir=(1, 0, 0), z_dir=(0, 0, 1)).offset(SPIEGELN2_START)):
        Polygon((81.15, -33.009608314), (81.15, -39.364160046), (86.85, -39.364160046), (86.85, -33.009608314), (86.85, -29.718711779), (84, -28.073263512), (81.15, -29.718711779), align=None)
    extrude(amount=-SPIEGELN2_COPY_5_DEPTH, mode=Mode.SUBTRACT)

    # Spiegeln2 copy 6 sketch → Spiegeln2 copy 6 (cut)
    with BuildSketch(Plane(origin=(-34, 39.528320093, 30), x_dir=(1, 0, 0), z_dir=(0, 0, 1)).offset(SPIEGELN2_START)):
        Polygon((81.15, -33.009608314), (81.15, -39.364160046), (86.85, -39.364160046), (86.85, -33.009608314), (86.85, -29.718711779), (84, -28.073263512), (81.15, -29.718711779), align=None)
    extrude(amount=-SPIEGELN2_COPY_6_DEPTH, mode=Mode.SUBTRACT)

    # Spiegeln2 copy 7 sketch → Spiegeln2 copy 7 (cut)
    with BuildSketch(Plane(origin=(-51, 39.528320093, 30), x_dir=(1, 0, 0), z_dir=(0, 0, 1)).offset(SPIEGELN2_START)):
        Polygon((81.15, -33.009608314), (81.15, -39.364160046), (86.85, -39.364160046), (86.85, -33.009608314), (86.85, -29.718711779), (84, -28.073263512), (81.15, -29.718711779), align=None)
    extrude(amount=-SPIEGELN2_COPY_7_DEPTH, mode=Mode.SUBTRACT)

    # Spiegeln2 copy 8 sketch → Spiegeln2 copy 8 (cut)
    with BuildSketch(Plane(origin=(-68, 39.528320093, 30), x_dir=(1, 0, 0), z_dir=(0, 0, 1)).offset(SPIEGELN2_START)):
        Polygon((81.15, -33.009608314), (81.15, -39.364160046), (86.85, -39.364160046), (86.85, -33.009608314), (86.85, -29.718711779), (84, -28.073263512), (81.15, -29.718711779), align=None)
    extrude(amount=-SPIEGELN2_COPY_8_DEPTH, mode=Mode.SUBTRACT)

    # Spiegeln3: Schnitt-Linear austragen4 across plane
    add(schnitt_linear_austragen4.mirror(Plane.ZX.offset(19.764160046)), mode=Mode.SUBTRACT)

    # Skizze51 → Schnitt-Linear austragen26 (cut, through all)
    with BuildSketch(Plane.ZY):
        with Locations((22.5, 19.682080023)):
            Rectangle(SKIZZE51_W, SKIZZE51_H)
    extrude(amount=-SCHNITT_LINEAR_AUSTRAGEN26_DEPTH, mode=Mode.SUBTRACT)


solid = part.part
